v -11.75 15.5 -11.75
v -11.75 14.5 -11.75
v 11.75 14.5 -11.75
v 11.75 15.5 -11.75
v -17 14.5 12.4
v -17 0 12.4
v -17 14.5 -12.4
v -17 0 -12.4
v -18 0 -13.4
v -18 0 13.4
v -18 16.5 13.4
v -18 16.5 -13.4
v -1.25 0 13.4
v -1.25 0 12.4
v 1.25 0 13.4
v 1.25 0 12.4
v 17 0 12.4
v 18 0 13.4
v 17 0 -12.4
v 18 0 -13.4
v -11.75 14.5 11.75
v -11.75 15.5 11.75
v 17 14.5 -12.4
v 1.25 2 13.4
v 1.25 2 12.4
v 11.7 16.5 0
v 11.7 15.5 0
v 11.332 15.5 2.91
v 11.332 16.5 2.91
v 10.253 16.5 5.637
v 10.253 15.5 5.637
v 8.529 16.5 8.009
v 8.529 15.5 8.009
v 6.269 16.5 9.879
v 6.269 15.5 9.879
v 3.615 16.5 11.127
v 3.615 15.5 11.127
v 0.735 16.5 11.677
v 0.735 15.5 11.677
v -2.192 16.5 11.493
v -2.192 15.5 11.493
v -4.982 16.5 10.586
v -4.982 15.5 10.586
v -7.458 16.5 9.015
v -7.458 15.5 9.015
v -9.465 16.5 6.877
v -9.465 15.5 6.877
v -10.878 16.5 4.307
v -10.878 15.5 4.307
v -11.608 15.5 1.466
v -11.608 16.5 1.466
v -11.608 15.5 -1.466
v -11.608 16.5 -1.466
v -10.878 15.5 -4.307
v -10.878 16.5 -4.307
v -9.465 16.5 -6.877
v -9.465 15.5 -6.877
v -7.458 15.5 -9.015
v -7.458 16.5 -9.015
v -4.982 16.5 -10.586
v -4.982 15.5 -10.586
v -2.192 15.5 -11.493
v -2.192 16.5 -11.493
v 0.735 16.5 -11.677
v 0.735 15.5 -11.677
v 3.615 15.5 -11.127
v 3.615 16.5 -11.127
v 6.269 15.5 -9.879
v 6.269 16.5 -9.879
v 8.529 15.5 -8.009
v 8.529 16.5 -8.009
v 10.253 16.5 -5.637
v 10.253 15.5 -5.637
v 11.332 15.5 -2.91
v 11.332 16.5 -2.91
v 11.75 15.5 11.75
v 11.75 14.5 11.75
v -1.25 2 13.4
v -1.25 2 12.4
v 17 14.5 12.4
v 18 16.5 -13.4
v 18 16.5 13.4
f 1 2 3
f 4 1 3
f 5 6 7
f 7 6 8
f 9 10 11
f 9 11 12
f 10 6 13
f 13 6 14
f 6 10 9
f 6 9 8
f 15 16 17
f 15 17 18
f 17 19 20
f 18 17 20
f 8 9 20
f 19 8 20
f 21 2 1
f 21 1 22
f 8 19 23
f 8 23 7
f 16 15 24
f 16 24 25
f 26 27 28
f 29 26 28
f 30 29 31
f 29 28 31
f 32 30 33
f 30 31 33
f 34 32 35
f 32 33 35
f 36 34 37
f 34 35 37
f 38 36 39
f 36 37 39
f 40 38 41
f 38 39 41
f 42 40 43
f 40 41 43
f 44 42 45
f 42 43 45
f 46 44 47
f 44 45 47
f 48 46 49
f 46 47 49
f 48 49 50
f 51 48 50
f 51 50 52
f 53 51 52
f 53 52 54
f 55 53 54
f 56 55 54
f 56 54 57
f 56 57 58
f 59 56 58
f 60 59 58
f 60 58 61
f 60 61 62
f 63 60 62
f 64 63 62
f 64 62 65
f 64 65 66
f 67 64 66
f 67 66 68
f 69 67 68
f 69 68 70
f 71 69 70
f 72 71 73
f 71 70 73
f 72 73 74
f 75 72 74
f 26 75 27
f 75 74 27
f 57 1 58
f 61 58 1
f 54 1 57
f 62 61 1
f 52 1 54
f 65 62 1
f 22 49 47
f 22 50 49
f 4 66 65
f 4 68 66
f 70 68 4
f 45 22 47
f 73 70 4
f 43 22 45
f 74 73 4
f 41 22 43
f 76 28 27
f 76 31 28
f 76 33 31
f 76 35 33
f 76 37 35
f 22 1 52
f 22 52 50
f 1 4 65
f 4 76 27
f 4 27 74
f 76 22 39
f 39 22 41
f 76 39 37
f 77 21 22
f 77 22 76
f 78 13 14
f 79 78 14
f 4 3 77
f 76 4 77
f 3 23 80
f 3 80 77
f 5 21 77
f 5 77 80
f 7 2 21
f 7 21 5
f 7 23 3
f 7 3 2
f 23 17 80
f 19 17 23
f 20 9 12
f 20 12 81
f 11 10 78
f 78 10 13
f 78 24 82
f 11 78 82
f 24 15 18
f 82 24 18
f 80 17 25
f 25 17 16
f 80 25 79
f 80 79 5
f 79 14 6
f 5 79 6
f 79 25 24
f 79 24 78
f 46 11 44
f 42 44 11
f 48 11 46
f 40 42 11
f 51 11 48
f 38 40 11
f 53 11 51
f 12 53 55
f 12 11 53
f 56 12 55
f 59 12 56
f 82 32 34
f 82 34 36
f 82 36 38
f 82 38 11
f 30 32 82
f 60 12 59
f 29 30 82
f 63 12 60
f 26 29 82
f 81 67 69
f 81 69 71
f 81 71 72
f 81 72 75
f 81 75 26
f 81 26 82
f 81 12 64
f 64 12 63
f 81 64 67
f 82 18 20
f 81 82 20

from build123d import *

# Parameters (mm, degrees)
SKETCH_190_W        = 36
SKETCH_190_H        = 26.8
EXTRUDE_1_DEPTH     = 16.5
SKETCH_353_W        = 34
SKETCH_353_H        = 24.8
CUT_EXTRUDE_1_DEPTH = 14.5
SKETCH_4_W          = 23.5
SKETCH_4_H          = 23.5
CUT_EXTRUDE_2_DEPTH = 1
SKETCH_5_R          = 11.7
CUT_EXTRUDE_3_DEPTH = 6
SKETCH_11_W         = 2.5
SKETCH_11_H         = 1
CUT_EXTRUDE_6_DEPTH = 2


with BuildPart() as part:
    # Sketch 190 → 凸台-拉伸1 (new body)
    with BuildSketch(Plane(origin=(0, 0, 0), x_dir=(1, 0, 0), z_dir=(0, 1, 0))):
        Rectangle(SKETCH_190_W, SKETCH_190_H)
    extrude(amount=EXTRUDE_1_DEPTH)

    # Sketch 353 → 切除-拉伸1 (cut)
    with BuildSketch(Plane(origin=(0, 0, 0), x_dir=(-1, 0, 0), z_dir=(0, -1, 0))):
        Rectangle(SKETCH_353_W, SKETCH_353_H)
    extrude(amount=-CUT_EXTRUDE_1_DEPTH, mode=Mode.SUBTRACT)

    # 草图4 → 切除-拉伸2 (cut)
    with BuildSketch(Plane.XZ.offset(-14.5)):
        Rectangle(SKETCH_4_W, SKETCH_4_H)
    extrude(amount=-CUT_EXTRUDE_2_DEPTH, mode=Mode.SUBTRACT)

    # 草图5 → 切除-拉伸3 (cut)
    with BuildSketch(Plane.XZ.offset(-15.5)):
        Circle(SKETCH_5_R)
    extrude(amount=-CUT_EXTRUDE_3_DEPTH, mode=Mode.SUBTRACT)

    # 草图11 → 切除-拉伸6 (cut)
    with BuildSketch(Plane(origin=(0, 0, 0), x_dir=(-1, 0, 0), z_dir=(0, -1, 0))):
        with Locations((0, -12.9)):
            Rectangle(SKETCH_11_W, SKETCH_11_H)
    extrude(amount=-CUT_EXTRUDE_6_DEPTH, mode=Mode.SUBTRACT)


solid = part.part
